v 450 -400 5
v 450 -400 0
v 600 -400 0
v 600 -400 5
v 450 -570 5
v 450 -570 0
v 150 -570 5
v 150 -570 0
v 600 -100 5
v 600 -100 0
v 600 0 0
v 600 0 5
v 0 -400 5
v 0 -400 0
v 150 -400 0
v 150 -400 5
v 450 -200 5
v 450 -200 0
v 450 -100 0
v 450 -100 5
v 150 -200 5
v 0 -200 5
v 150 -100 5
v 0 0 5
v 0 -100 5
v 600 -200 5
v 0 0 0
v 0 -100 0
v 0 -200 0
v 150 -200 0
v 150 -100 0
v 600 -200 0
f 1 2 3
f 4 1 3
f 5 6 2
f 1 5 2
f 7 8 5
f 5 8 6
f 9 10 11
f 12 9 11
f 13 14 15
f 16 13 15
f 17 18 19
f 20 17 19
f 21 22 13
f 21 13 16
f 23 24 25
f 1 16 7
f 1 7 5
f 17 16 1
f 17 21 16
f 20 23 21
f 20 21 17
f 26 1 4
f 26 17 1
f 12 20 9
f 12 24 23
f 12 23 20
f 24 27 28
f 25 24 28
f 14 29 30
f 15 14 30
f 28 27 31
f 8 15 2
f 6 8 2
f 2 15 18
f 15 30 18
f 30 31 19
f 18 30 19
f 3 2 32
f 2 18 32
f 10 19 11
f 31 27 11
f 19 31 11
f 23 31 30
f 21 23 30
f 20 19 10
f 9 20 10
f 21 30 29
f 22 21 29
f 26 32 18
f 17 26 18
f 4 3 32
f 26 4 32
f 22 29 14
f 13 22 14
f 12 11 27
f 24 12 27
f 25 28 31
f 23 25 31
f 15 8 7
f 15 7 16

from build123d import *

# Parameters (mm, degrees)
F0_W     = 300
F0_H     = 170
F1_DEPTH = 5


with BuildPart() as f1:
    # F0 (on Top) → F1 (new body)
    with BuildSketch(Plane.XY):
        Polygon((600, 0), (0, 0), (0, -100), (150, -100), (150, -200), (0, -200), (0, -400), (150, -400), (450, -400), (600, -400), (600, -200), (450, -200), (450, -100), (600, -100), align=None)
        with Locations((300, -485)):
            Rectangle(F0_W, F0_H)
    extrude(amount=F1_DEPTH)


solid = f1.part
